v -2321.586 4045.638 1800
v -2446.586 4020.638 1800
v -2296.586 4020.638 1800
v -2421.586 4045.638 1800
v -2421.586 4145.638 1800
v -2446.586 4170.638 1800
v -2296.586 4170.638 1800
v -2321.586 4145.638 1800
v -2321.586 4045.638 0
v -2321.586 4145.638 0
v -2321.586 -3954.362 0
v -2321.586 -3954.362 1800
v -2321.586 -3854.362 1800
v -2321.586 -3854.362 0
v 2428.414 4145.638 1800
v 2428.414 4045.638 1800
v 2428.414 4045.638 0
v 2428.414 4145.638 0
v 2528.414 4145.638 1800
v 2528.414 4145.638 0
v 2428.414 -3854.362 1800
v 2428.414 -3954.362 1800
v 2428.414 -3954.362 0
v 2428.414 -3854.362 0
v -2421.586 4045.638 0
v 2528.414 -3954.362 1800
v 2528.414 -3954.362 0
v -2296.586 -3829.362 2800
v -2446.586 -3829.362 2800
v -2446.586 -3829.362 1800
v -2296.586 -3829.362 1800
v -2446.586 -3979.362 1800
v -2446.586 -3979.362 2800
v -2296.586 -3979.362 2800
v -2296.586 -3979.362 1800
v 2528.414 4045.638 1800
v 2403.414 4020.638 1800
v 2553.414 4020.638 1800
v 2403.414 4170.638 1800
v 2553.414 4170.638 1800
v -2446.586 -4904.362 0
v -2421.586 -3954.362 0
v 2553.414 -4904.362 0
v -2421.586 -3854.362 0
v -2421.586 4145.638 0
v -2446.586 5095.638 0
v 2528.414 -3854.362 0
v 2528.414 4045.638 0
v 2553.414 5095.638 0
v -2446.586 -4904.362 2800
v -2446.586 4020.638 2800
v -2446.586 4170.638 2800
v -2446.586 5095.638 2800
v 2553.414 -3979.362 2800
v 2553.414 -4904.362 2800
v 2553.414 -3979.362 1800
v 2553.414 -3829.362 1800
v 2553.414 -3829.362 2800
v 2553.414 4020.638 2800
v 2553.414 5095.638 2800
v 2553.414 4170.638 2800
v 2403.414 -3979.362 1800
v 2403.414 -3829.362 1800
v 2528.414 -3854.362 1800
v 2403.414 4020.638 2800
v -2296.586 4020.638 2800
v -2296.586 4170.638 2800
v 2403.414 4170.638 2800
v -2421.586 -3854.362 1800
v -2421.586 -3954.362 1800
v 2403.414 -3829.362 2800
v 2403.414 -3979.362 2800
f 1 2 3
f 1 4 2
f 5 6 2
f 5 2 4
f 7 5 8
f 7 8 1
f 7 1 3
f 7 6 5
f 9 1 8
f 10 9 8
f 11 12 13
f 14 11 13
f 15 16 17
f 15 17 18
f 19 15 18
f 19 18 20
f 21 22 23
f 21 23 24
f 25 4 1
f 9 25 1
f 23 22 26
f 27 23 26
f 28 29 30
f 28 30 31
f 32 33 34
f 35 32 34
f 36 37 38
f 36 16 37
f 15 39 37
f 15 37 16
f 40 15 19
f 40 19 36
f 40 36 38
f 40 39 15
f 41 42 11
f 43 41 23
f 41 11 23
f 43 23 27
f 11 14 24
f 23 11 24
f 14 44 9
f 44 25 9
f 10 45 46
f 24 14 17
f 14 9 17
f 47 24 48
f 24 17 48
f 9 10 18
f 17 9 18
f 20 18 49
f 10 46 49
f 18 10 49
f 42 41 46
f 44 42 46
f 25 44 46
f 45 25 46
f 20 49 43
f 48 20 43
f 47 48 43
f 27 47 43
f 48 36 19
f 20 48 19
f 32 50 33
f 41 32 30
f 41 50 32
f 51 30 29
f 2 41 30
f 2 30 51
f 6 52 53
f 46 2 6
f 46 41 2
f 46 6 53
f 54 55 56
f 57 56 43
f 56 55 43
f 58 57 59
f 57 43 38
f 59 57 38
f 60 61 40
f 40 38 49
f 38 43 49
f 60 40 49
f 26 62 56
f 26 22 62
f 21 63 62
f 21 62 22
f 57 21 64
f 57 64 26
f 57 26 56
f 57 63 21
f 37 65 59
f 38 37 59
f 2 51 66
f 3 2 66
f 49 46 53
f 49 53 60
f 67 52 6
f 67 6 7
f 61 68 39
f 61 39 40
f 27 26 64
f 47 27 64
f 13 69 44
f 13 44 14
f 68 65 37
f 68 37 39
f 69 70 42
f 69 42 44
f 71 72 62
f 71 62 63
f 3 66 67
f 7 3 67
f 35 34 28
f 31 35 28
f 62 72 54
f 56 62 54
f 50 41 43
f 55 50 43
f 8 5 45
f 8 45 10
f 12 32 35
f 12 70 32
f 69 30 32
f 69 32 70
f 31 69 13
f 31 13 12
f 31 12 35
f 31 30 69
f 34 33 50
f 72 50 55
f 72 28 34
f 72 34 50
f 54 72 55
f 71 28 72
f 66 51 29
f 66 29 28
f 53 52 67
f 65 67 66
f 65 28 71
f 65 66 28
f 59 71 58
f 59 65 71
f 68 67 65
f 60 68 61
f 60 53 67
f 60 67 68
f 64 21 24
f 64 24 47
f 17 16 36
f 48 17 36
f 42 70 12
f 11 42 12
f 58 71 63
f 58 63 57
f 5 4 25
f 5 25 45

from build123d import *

# Parameters (mm, degrees)
F0_W     = 5000
F0_H     = 10000
F1_DEPTH = 2800
F2_W     = 150
F2_H     = 150
F3_DEPTH = 1000
F4_W     = 100
F4_H     = 100
F5_DEPTH = 1800


with BuildPart() as f1:
    # F0 (on Top) → F1 (new body)
    with BuildSketch(Plane.XY):
        with Locations((53.413546, 95.638355)):
            Rectangle(F0_W, F0_H)
    extrude(amount=F1_DEPTH)

    # F2 (on face) → F3 (cut)
    with BuildSketch(Plane.XY.offset(2800)):
        with Locations((-2371.586454, 4095.638355)):
            Rectangle(F2_W, F2_H)
        with Locations((2478.413546, 4095.638355)):
            Rectangle(F2_W, F2_H)
        with Locations((2478.413546, -3904.361645)):
            Rectangle(F2_W, F2_H)
        with Locations((-2371.586454, -3904.361645)):
            Rectangle(F2_W, F2_H)
    extrude(amount=-F3_DEPTH, mode=Mode.SUBTRACT)

    # F4 (on face) → F5 (cut)
    with BuildSketch(Plane.XY.offset(1800)):
        with Locations((2478.413546, 4095.638355)):
            Rectangle(F4_W, F4_H)
        with Locations((-2371.586454, 4095.638355)):
            Rectangle(F4_W, F4_H)
        with Locations((-2371.586454, -3904.361645)):
            Rectangle(F4_W, F4_H)
        with Locations((2478.413546, -3904.361645)):
            Rectangle(F4_W, F4_H)
    extrude(amount=-F5_DEPTH, mode=Mode.SUBTRACT)


solid = f1.part
